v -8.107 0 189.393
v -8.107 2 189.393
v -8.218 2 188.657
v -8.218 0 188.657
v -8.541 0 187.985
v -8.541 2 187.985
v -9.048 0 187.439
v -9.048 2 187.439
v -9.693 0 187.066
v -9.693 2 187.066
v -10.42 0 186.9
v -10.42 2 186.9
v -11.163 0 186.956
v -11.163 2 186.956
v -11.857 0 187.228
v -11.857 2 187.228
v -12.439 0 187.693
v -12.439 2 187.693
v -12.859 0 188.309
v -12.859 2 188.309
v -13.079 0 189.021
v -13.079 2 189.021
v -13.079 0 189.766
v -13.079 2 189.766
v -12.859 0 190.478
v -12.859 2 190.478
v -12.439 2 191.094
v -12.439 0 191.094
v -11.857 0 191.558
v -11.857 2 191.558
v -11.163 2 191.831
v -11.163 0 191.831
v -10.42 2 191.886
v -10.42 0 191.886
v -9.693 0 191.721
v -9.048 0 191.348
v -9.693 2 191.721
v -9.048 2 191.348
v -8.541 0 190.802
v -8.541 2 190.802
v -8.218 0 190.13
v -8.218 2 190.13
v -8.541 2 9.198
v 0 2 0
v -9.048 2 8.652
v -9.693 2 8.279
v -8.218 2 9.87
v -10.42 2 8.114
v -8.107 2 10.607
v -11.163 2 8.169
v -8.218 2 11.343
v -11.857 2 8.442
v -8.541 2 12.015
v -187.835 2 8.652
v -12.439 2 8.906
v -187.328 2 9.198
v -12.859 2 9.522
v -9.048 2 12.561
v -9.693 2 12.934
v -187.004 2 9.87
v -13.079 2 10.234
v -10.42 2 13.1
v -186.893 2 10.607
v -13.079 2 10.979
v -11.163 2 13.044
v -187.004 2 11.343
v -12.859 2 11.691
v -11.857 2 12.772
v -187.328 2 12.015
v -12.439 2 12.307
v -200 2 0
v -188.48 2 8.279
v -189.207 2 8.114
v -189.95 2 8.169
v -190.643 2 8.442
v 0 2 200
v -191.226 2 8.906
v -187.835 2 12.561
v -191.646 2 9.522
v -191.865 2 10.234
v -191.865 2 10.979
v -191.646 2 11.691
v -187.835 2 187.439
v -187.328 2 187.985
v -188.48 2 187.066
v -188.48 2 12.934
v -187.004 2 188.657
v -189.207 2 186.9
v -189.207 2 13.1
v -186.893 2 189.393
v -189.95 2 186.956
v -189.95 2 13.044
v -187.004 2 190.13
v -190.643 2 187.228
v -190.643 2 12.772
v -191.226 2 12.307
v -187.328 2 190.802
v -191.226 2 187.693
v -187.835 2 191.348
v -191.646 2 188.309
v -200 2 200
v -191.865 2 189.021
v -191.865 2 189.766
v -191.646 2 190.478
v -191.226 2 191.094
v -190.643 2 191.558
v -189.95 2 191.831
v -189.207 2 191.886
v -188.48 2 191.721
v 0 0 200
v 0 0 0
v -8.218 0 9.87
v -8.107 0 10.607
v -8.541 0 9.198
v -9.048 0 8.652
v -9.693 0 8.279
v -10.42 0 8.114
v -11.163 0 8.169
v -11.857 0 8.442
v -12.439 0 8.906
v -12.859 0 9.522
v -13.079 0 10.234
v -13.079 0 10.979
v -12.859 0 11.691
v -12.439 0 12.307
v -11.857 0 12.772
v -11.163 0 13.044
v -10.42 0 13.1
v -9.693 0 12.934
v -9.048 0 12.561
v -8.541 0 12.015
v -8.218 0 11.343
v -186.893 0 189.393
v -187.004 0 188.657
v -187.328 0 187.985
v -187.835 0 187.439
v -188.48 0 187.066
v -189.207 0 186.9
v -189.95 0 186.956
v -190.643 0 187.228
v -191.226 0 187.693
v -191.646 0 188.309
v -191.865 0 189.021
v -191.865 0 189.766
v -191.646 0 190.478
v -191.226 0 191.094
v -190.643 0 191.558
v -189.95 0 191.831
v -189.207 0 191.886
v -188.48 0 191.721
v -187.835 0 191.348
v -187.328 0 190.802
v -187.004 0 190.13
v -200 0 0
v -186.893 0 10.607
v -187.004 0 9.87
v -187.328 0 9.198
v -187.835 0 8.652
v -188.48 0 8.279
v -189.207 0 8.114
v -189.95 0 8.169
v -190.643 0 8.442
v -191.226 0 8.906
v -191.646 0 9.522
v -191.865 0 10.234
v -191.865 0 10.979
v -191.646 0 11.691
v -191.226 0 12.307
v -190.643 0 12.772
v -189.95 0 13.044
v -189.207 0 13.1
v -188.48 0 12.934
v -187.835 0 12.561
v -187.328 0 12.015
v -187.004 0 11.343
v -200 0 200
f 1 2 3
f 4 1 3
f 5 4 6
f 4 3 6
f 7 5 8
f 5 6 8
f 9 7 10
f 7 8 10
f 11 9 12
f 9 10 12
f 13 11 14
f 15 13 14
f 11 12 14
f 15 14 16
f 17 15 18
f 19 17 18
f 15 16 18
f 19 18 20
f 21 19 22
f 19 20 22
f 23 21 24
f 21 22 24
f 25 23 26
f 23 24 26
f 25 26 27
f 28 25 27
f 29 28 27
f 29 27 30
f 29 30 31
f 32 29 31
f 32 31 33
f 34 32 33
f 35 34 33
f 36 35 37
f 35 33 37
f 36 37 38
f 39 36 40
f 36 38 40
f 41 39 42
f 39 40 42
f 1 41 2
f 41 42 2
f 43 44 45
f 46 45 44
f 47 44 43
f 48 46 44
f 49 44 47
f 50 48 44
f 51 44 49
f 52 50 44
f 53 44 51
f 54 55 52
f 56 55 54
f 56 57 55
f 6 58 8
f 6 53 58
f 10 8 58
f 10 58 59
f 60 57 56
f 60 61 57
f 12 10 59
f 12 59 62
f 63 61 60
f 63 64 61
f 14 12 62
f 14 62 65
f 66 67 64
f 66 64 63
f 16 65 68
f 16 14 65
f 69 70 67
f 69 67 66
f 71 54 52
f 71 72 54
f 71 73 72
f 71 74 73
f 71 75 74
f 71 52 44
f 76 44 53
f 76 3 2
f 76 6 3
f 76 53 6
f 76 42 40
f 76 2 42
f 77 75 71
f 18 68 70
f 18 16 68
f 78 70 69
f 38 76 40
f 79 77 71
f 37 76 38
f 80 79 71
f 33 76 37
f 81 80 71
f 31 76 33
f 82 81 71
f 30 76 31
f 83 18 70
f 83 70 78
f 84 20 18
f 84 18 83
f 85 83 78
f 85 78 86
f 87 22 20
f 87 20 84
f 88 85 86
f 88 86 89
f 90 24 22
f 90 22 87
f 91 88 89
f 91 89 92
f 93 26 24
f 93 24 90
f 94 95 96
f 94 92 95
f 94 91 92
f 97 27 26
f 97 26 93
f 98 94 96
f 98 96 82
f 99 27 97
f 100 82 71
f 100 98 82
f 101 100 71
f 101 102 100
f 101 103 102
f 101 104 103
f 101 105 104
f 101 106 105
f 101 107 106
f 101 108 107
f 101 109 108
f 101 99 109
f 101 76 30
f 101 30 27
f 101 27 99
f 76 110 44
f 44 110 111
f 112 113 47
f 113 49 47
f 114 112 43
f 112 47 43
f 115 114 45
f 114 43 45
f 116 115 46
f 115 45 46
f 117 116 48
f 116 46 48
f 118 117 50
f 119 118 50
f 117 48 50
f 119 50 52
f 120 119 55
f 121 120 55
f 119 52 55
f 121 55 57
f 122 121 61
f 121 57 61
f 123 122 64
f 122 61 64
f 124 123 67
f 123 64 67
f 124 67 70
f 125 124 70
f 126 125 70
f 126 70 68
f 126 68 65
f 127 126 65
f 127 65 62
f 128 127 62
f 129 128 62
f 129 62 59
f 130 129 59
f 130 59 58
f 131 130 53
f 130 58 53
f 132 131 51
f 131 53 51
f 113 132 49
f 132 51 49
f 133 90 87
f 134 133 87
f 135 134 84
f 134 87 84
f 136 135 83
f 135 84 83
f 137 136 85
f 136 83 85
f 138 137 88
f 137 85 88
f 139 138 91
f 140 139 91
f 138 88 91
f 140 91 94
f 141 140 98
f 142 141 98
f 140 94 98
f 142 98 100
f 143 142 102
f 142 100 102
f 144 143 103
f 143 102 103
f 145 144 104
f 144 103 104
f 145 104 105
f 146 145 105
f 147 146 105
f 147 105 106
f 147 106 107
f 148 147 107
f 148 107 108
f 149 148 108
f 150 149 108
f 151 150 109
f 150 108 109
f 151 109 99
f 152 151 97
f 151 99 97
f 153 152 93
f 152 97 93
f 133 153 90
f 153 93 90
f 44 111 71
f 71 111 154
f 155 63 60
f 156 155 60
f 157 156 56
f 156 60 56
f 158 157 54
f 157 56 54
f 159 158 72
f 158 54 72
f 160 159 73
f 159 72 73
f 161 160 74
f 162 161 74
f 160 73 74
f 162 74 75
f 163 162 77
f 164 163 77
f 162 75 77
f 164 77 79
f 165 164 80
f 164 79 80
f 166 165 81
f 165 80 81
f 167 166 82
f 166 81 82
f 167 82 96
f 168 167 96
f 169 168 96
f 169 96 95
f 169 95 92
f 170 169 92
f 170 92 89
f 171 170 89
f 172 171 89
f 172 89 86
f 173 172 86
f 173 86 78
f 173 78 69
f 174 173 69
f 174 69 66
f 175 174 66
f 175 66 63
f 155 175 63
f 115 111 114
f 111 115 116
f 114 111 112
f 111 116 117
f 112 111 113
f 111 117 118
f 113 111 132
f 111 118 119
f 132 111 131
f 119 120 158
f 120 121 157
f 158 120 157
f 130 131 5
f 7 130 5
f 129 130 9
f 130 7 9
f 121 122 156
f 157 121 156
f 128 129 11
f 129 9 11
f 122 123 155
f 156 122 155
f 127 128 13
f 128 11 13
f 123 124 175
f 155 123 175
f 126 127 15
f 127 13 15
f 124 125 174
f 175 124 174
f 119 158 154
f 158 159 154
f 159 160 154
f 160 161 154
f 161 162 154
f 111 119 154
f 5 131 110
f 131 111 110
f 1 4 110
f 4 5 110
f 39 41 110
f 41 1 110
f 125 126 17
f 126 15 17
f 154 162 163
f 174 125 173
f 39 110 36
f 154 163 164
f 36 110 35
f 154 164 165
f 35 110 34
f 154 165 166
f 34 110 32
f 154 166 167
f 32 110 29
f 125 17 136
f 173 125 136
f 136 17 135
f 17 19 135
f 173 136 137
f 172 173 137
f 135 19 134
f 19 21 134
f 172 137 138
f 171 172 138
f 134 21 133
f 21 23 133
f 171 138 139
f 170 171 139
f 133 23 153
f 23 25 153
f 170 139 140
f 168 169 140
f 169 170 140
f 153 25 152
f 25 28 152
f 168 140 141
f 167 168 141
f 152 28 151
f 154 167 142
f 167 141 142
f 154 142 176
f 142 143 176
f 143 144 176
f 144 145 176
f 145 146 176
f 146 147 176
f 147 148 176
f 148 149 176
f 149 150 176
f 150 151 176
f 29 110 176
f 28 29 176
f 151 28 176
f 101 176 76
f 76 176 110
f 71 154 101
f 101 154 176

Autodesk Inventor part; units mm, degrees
ref_plane "YZ Plane" through (0, 0, 0) normal (1, 0, 0) x (0, 1, 0)
ref_plane "XZ Plane" through (0, 0, 0) normal (0, 1, 0) x (-1, 0, 0)
ref_plane "XY Plane" through (0, 0, 0) normal (0, 0, 1) x (1, 0, 0)
sketch "Sketch1" plane through (0, 0, 0) normal (0, 1, 0) x (-1, 0, 0)
  line L0 (0, 0) -> (200, 0)
  line L1 (200, 0) -> (200, 200)
  line L2 (200, 200) -> (0, 200)
  line L3 (0, 200) -> (0, 0)
  dimension "d0" = 200
  dimension "d1" = 200
extrude "Extrusion1" add sketch "Sketch1" along normal blind 2
sketch "Sketch2" plane through (0, 2, 0) normal (0, 1, 0) x (1, 0, 0)
  line L0 (-200, -200) -> (0, -200) projected
  line L1 (0, 0) -> (-200, 0) projected
  line L2 (0, -200) -> (0, 0) projected
  line L3 (-200, 0) -> (-200, -200) projected
  circle A0 centre (-10.6066, -189.3934) radius 2.5
  circle A1 centre (-189.3934, -189.3934) radius 2.5
  circle A2 centre (-10.6066, -10.6066) radius 2.5
  circle A3 centre (-189.3934, -10.6066) radius 2.5
  dimension "d9" = 5
  dimension "d10" = 5
extrude "Extrusion2" cut sketch "Sketch2" against normal blind 2 contours A0 | A1 | A2 | A3
properties part number "MAN_BASIS_PLATE" material "ABS Plastic"
